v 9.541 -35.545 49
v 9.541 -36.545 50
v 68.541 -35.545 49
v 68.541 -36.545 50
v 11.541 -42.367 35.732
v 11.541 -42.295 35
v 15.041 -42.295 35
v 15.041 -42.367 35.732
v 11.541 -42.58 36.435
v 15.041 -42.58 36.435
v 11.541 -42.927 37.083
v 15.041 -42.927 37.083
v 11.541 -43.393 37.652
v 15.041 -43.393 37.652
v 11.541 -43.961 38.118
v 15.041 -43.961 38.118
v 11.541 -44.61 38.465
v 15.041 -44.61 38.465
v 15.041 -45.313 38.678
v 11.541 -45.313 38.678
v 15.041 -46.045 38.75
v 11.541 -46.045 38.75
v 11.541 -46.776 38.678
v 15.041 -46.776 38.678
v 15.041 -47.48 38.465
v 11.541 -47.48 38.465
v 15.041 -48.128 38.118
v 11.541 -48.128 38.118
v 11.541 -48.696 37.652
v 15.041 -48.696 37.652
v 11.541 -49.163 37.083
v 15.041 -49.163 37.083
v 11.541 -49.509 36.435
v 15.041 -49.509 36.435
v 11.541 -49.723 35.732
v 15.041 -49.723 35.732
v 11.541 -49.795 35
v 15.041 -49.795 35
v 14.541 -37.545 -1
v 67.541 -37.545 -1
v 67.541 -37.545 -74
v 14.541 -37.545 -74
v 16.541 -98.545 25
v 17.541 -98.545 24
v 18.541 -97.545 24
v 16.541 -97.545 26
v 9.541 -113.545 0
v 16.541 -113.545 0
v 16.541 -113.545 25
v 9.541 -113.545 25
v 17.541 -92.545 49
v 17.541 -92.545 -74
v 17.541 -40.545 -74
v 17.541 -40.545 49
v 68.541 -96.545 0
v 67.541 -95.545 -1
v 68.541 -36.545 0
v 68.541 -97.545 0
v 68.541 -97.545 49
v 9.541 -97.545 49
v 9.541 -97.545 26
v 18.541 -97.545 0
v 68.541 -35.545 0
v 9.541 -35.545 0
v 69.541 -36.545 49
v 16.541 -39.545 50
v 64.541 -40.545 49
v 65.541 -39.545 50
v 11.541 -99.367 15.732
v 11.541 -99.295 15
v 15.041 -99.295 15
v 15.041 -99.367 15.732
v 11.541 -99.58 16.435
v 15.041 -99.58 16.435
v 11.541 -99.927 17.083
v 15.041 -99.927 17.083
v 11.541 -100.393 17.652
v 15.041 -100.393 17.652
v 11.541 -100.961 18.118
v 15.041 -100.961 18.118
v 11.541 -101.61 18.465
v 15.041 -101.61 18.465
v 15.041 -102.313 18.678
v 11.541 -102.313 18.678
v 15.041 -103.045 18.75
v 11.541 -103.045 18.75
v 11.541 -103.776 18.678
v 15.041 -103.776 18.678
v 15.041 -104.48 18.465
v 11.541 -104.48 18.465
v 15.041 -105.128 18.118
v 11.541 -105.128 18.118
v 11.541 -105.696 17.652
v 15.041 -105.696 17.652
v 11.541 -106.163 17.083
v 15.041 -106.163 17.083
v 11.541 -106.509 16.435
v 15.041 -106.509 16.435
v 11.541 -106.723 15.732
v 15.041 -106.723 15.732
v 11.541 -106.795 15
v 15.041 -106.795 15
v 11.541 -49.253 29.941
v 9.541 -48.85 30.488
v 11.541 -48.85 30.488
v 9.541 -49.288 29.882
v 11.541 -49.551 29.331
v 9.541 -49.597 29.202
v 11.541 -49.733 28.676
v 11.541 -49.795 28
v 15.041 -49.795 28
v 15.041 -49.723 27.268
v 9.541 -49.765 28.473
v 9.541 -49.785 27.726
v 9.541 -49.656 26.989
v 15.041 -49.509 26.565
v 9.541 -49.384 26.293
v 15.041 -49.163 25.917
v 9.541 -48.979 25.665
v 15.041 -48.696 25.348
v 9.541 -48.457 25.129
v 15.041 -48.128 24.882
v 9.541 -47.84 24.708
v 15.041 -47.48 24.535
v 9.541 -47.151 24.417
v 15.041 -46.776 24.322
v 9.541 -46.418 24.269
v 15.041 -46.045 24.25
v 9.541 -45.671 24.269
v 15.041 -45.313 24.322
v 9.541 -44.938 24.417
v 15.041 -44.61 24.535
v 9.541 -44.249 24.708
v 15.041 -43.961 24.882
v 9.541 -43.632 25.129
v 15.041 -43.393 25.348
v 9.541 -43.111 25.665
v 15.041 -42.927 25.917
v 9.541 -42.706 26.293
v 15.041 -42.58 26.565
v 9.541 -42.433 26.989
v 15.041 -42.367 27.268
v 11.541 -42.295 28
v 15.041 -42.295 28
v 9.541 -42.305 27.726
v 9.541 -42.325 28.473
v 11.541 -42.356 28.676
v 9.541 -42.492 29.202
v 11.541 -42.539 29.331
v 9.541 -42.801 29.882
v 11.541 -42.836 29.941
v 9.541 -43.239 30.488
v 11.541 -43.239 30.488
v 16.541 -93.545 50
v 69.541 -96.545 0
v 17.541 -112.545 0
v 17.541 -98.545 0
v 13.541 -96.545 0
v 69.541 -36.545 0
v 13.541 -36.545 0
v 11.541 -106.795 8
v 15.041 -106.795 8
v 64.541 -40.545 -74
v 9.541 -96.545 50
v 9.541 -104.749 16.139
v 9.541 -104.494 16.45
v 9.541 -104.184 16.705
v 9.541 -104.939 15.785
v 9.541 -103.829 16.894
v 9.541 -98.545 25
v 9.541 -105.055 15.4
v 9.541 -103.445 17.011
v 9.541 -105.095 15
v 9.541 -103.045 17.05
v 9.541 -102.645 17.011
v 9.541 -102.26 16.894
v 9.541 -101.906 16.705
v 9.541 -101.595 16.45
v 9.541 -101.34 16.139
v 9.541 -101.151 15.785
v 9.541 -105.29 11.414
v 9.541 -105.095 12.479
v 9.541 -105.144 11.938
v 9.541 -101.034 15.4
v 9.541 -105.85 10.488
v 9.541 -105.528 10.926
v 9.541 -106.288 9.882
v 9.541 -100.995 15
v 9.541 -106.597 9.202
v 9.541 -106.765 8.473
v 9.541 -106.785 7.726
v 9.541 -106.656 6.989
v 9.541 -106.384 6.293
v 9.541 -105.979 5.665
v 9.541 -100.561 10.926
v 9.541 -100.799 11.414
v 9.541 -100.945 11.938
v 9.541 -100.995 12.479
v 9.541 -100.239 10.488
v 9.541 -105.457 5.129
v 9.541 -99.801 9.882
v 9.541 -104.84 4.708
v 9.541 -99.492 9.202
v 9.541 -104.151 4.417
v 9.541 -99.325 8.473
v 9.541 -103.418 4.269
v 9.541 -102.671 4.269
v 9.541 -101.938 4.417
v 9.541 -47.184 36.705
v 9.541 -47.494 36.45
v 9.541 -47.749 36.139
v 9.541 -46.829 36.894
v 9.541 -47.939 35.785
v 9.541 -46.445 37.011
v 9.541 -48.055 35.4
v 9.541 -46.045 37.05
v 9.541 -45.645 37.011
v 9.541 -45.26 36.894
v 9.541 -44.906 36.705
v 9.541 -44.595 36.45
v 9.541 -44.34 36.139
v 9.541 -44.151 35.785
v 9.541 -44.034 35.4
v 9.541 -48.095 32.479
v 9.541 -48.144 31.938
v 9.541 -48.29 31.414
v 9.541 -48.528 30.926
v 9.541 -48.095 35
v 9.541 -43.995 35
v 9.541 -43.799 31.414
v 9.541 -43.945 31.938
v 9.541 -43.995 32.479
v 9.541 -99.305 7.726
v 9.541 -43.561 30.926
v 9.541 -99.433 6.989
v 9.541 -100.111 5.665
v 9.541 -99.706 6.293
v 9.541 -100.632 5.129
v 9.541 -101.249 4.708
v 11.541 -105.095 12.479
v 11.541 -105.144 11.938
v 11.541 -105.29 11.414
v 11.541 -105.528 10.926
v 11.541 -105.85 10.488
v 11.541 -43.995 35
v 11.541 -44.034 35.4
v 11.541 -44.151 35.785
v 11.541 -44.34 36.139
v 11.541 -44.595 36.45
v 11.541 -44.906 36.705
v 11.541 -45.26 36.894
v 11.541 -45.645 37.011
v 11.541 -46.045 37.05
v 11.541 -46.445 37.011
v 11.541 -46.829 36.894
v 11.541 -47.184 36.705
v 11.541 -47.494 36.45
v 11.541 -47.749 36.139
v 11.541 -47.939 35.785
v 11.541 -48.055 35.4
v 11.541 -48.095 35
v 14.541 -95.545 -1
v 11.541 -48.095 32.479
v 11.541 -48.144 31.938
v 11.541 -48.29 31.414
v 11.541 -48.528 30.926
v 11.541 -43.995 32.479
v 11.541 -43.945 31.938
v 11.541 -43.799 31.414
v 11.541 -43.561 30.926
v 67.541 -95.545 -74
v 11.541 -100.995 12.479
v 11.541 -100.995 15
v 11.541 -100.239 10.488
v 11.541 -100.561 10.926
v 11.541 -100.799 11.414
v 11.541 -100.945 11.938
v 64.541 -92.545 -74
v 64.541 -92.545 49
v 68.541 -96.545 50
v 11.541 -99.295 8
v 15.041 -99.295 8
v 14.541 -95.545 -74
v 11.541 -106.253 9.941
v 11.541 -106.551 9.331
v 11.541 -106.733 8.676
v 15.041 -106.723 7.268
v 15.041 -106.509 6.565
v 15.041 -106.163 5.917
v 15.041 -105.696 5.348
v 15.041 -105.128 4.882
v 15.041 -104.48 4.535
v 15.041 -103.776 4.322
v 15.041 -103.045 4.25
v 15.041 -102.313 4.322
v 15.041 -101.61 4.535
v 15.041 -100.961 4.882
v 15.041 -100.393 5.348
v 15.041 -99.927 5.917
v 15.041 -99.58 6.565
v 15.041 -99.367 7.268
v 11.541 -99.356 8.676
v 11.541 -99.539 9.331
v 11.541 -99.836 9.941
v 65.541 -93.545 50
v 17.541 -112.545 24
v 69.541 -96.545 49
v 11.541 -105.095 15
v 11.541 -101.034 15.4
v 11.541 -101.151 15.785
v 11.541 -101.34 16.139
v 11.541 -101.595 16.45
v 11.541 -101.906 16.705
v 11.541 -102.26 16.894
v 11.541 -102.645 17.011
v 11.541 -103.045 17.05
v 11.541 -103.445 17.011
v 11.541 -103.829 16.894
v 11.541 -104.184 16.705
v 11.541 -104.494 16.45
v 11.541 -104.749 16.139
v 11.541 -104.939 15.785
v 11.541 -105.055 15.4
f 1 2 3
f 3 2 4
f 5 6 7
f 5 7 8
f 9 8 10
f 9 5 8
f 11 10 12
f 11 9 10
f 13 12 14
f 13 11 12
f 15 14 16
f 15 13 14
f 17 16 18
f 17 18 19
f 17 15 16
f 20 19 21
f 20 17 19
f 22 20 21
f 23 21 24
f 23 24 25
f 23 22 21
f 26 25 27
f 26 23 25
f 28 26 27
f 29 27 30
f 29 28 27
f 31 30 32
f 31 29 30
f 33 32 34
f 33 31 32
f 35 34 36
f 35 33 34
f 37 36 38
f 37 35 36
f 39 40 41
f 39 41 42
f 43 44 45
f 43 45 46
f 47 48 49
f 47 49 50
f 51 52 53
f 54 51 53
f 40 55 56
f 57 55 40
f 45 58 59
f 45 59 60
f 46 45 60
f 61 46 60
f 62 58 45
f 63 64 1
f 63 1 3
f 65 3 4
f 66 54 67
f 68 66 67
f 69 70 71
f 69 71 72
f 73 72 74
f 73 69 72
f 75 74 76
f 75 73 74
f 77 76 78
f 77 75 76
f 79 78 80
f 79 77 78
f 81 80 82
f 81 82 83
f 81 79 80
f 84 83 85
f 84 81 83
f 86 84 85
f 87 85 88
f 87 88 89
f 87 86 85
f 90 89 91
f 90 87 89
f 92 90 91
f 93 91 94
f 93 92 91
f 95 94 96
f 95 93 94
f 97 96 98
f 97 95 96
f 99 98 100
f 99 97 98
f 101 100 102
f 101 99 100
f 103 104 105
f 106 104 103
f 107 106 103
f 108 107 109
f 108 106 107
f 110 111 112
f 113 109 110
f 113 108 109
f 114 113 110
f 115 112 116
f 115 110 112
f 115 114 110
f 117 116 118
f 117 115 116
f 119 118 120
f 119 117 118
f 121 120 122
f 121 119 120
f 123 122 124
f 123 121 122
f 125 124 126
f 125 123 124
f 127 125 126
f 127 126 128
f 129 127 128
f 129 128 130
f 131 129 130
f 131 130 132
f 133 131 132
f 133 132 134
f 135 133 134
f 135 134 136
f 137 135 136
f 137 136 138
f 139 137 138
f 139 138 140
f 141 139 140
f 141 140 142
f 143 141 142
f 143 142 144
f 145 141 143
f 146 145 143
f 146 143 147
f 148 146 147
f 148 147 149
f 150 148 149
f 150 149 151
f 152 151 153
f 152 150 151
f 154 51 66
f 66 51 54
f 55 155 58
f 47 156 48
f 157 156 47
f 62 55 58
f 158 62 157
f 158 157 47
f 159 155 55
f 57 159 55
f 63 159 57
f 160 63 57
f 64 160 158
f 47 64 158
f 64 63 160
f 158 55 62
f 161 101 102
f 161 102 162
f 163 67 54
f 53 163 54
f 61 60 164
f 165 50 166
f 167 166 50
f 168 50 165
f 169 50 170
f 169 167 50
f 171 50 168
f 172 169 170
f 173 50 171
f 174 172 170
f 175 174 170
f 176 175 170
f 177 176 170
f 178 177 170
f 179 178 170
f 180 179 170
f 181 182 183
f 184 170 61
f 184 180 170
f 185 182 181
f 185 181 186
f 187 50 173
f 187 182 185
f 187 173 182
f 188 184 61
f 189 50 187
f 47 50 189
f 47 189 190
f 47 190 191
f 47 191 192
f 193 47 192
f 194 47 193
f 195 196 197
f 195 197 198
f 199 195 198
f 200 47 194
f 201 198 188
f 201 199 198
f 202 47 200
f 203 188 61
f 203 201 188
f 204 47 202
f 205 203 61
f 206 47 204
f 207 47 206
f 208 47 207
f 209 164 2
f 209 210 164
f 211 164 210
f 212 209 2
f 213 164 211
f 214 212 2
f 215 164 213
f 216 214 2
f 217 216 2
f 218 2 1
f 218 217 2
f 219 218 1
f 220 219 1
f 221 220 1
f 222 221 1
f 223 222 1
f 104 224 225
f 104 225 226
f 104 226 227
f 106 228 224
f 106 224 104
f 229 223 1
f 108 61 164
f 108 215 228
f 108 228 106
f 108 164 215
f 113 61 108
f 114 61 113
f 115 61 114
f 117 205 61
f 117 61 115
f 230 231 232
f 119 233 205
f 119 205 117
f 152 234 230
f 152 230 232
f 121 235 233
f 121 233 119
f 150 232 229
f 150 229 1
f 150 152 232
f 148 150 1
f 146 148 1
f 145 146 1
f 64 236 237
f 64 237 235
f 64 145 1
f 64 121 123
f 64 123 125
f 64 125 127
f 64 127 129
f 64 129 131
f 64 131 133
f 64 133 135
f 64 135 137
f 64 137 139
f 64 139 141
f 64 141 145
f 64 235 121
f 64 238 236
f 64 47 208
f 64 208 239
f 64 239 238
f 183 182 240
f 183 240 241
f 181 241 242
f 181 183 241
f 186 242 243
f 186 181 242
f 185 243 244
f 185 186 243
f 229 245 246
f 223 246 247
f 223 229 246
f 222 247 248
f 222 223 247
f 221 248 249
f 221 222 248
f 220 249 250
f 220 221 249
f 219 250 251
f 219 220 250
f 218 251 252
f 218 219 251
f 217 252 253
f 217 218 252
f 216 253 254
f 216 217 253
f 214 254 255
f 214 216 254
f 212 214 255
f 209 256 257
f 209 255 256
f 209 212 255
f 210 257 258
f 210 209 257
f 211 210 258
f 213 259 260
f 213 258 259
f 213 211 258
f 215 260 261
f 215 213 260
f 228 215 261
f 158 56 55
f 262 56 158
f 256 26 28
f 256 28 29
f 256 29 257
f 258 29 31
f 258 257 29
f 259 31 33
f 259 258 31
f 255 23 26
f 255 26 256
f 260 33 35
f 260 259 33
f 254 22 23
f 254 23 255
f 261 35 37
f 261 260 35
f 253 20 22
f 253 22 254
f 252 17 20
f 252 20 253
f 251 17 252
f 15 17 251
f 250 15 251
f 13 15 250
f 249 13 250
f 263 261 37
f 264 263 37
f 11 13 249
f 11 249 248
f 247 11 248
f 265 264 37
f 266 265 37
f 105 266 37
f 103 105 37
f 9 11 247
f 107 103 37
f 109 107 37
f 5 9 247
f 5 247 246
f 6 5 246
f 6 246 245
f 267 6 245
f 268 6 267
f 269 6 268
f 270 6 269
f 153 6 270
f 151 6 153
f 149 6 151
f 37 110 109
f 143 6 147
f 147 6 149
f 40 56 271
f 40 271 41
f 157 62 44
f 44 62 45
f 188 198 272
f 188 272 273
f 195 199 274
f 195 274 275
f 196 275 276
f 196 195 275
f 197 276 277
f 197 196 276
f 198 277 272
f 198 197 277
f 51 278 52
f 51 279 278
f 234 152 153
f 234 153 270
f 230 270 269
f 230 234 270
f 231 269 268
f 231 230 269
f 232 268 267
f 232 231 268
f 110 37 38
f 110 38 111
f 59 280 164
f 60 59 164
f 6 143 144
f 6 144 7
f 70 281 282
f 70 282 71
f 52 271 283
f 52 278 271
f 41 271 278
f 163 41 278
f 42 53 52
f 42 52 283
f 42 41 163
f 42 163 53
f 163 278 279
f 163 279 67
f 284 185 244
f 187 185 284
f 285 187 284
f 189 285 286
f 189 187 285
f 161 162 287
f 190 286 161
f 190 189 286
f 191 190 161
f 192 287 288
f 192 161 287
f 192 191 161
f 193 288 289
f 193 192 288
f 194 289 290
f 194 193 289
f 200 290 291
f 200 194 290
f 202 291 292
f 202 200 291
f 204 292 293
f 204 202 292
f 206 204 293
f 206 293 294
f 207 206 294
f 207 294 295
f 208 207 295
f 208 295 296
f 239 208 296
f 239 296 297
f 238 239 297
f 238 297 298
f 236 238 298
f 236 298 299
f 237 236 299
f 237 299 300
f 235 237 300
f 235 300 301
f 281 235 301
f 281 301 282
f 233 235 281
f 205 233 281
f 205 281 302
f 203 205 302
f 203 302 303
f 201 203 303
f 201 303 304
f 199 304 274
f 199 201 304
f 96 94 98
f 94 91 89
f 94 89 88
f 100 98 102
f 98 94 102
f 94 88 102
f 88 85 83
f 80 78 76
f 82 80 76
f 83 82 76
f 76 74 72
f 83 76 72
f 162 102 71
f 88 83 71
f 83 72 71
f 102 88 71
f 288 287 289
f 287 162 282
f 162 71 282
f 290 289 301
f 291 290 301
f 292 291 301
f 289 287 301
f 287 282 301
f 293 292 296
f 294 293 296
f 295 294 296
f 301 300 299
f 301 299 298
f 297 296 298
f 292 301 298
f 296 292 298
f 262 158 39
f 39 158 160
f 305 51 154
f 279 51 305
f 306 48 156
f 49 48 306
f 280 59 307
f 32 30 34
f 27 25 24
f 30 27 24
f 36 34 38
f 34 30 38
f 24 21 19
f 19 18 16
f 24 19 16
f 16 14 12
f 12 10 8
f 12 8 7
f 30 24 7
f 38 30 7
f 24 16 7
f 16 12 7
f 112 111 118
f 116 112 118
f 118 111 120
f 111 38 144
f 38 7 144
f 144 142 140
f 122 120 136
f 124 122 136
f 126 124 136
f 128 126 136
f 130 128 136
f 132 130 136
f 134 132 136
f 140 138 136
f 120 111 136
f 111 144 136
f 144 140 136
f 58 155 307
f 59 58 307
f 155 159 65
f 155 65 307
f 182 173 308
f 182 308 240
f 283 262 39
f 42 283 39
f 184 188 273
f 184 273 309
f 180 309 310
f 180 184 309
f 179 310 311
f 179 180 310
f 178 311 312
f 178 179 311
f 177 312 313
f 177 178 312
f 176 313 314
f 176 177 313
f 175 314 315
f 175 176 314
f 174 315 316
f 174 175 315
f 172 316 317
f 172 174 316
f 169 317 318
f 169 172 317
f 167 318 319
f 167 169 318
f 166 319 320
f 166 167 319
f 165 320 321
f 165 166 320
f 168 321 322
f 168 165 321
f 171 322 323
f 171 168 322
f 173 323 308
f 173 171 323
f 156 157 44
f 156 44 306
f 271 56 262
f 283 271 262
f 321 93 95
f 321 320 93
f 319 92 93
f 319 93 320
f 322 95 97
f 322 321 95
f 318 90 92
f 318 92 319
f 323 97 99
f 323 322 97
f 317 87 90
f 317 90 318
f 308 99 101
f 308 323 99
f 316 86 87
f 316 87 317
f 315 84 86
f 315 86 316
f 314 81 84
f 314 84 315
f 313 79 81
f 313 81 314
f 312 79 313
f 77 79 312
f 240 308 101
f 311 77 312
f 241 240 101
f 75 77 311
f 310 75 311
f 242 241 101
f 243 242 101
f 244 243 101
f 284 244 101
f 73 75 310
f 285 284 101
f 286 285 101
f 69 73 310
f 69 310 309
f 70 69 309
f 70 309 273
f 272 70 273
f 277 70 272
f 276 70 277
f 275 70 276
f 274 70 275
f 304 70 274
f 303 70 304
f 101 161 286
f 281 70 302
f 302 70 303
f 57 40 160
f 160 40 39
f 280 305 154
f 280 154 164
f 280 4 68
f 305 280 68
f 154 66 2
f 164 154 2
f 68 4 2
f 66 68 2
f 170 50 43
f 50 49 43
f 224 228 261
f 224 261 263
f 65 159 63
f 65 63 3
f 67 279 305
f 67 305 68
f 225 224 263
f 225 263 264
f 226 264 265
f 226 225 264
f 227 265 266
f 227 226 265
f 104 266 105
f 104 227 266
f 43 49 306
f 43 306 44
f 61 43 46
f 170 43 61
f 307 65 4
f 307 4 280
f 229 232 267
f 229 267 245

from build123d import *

# Parameters (mm, degrees)
SKETCH1_W           = 47
SKETCH1_H           = 52
BOSS_EXTRUDE1_DEPTH = 50
SKETCH8_W           = 25
SKETCH8_H           = 16
CUT_EXTRUDE1_DEPTH  = 10
CUT_EXTRUDE2_START  = -2
CUT_EXTRUDE2_DEPTH  = 3.5
CUT_EXTRUDE3_DEPTH  = 3.5
CHAMFER1_SIZE       = 1
SKETCH6_W           = 53
SKETCH6_H           = 58
SKETCH6_W_2         = 47
SKETCH6_H_2         = 52
BOSS_EXTRUDE3_DEPTH = 74
CHAMFER2_SIZE       = 1


with BuildPart() as part:
    # Sketch1 → Boss-Extrude1 (new body)
    with BuildSketch(Plane.XY):
        Polygon((17.540775456, -97.544656267), (17.540775456, -113.544656267), (9.540775456, -113.544656267), (9.540775456, -35.544656267), (69.540775456, -35.544656267), (69.540775456, -97.544656267), align=None)
        with Locations((41.040775456, -66.544656267)):
            Rectangle(SKETCH1_W, SKETCH1_H, mode=Mode.SUBTRACT)
    extrude(amount=BOSS_EXTRUDE1_DEPTH)

    # Sketch8 → Cut-Extrude1 (cut)
    with BuildSketch(Plane(origin=(17.540775456, 0, 0), x_dir=(0, 0, -1), z_dir=(1, 0, 0))):
        with Locations((-37.5, -105.544656267)):
            Rectangle(SKETCH8_W, SKETCH8_H)
    extrude(amount=-CUT_EXTRUDE1_DEPTH, mode=Mode.SUBTRACT)

    # Sketch9 → Cut-Extrude2 (cut)
    with BuildSketch(Plane.ZY.offset(-9.540775456).offset(CUT_EXTRUDE2_START)):
        with BuildLine():
            Line((35, -49.794656267), (28, -49.794656267))
            ThreePointArc((28, -49.794656267), (24.25, -46.044656267), (28, -42.294656267))
            Line((28, -42.294656267), (35, -42.294656267))
            ThreePointArc((35, -42.294656267), (38.75, -46.044656267), (35, -49.794656267))
        make_face()
        with BuildLine():
            Line((15, -106.794656267), (8, -106.794656267))
            ThreePointArc((8, -106.794656267), (4.25, -103.044656267), (8, -99.294656267))
            Line((8, -99.294656267), (15, -99.294656267))
            ThreePointArc((15, -99.294656267), (18.75, -103.044656267), (15, -106.794656267))
        make_face()
    extrude(amount=-CUT_EXTRUDE2_DEPTH, mode=Mode.SUBTRACT)

    # Sketch10 → Cut-Extrude3 (cut)
    with BuildSketch(Plane.ZY.offset(-9.540775456)):
        with BuildLine():
            Line((35, -48.094656267), (32.478839135, -48.094656267))
            ThreePointArc((32.478839135, -48.094656267), (31.41425784, -48.289898404), (30.488243964, -48.850211822))
            ThreePointArc((30.488243964, -48.850211822), (24.25, -46.044656267), (30.488243964, -43.239100711))
            ThreePointArc((30.488243964, -43.239100711), (31.41425784, -43.799414129), (32.478839135, -43.994656267))
            Line((32.478839135, -43.994656267), (35, -43.994656267))
            ThreePointArc((35, -43.994656267), (37.05, -46.044656267), (35, -48.094656267))
        make_face()
        with BuildLine():
            Line((12.478839135, -100.994656267), (15, -100.994656267))
            ThreePointArc((15, -100.994656267), (17.05, -103.044656267), (15, -105.094656267))
            Line((15, -105.094656267), (12.478839135, -105.094656267))
            ThreePointArc((12.478839135, -105.094656267), (11.41425784, -105.289898404), (10.488243964, -105.850211822))
            ThreePointArc((10.488243964, -105.850211822), (4.25, -103.044656267), (10.488243964, -100.239100711))
            ThreePointArc((10.488243964, -100.239100711), (11.41425784, -100.799414129), (12.478839135, -100.994656267))
        make_face()
    extrude(amount=-CUT_EXTRUDE3_DEPTH, mode=Mode.SUBTRACT)

    # Chamfer1
    chamfer1_edges = [part.edges().sort_by_distance(p)[0] for p in [
        (69.540775456, -35.544656267, 25),
        (69.540775456, -97.544656267, 25),
        (39.540775456, -35.544656267, 50),
        (17.540775456, -66.544656267, 50),
        (41.040775456, -92.544656267, 50),
        (64.540775456, -66.544656267, 50),
        (41.040775456, -40.544656267, 50),
        (17.540775456, -97.544656267, 12.5),
        (17.540775456, -113.544656267, 12.5),
        (13.540775456, -97.544656267, 25),
        (17.540775456, -105.544656267, 25),
        (39.540775456, -97.544656267, 50),
        (69.540775456, -66.544656267, 50),
    ]]
    chamfer(chamfer1_edges, length=CHAMFER1_SIZE)

    # Sketch6 → Boss-Extrude3 (add)
    with BuildSketch(Plane(origin=(0, 0, 0), x_dir=(-1, 0, 0), z_dir=(0, 0, -1))):
        with Locations((-41.040775456, -66.544656267)):
            Rectangle(SKETCH6_W, SKETCH6_H)
        with Locations((-41.040775456, -66.544656267)):
            Rectangle(SKETCH6_W_2, SKETCH6_H_2, mode=Mode.SUBTRACT)
    extrude(amount=BOSS_EXTRUDE3_DEPTH)

    # Chamfer2
    chamfer2_edges = [part.edges().sort_by_distance(p)[0] for p in [
        (67.540775456, -66.544656267, 0),
        (41.040775456, -95.544656267, 0),
        (14.540775456, -66.544656267, 0),
        (41.040775456, -37.544656267, 0),
    ]]
    chamfer(chamfer2_edges, length=CHAMFER2_SIZE)


solid = part.part
